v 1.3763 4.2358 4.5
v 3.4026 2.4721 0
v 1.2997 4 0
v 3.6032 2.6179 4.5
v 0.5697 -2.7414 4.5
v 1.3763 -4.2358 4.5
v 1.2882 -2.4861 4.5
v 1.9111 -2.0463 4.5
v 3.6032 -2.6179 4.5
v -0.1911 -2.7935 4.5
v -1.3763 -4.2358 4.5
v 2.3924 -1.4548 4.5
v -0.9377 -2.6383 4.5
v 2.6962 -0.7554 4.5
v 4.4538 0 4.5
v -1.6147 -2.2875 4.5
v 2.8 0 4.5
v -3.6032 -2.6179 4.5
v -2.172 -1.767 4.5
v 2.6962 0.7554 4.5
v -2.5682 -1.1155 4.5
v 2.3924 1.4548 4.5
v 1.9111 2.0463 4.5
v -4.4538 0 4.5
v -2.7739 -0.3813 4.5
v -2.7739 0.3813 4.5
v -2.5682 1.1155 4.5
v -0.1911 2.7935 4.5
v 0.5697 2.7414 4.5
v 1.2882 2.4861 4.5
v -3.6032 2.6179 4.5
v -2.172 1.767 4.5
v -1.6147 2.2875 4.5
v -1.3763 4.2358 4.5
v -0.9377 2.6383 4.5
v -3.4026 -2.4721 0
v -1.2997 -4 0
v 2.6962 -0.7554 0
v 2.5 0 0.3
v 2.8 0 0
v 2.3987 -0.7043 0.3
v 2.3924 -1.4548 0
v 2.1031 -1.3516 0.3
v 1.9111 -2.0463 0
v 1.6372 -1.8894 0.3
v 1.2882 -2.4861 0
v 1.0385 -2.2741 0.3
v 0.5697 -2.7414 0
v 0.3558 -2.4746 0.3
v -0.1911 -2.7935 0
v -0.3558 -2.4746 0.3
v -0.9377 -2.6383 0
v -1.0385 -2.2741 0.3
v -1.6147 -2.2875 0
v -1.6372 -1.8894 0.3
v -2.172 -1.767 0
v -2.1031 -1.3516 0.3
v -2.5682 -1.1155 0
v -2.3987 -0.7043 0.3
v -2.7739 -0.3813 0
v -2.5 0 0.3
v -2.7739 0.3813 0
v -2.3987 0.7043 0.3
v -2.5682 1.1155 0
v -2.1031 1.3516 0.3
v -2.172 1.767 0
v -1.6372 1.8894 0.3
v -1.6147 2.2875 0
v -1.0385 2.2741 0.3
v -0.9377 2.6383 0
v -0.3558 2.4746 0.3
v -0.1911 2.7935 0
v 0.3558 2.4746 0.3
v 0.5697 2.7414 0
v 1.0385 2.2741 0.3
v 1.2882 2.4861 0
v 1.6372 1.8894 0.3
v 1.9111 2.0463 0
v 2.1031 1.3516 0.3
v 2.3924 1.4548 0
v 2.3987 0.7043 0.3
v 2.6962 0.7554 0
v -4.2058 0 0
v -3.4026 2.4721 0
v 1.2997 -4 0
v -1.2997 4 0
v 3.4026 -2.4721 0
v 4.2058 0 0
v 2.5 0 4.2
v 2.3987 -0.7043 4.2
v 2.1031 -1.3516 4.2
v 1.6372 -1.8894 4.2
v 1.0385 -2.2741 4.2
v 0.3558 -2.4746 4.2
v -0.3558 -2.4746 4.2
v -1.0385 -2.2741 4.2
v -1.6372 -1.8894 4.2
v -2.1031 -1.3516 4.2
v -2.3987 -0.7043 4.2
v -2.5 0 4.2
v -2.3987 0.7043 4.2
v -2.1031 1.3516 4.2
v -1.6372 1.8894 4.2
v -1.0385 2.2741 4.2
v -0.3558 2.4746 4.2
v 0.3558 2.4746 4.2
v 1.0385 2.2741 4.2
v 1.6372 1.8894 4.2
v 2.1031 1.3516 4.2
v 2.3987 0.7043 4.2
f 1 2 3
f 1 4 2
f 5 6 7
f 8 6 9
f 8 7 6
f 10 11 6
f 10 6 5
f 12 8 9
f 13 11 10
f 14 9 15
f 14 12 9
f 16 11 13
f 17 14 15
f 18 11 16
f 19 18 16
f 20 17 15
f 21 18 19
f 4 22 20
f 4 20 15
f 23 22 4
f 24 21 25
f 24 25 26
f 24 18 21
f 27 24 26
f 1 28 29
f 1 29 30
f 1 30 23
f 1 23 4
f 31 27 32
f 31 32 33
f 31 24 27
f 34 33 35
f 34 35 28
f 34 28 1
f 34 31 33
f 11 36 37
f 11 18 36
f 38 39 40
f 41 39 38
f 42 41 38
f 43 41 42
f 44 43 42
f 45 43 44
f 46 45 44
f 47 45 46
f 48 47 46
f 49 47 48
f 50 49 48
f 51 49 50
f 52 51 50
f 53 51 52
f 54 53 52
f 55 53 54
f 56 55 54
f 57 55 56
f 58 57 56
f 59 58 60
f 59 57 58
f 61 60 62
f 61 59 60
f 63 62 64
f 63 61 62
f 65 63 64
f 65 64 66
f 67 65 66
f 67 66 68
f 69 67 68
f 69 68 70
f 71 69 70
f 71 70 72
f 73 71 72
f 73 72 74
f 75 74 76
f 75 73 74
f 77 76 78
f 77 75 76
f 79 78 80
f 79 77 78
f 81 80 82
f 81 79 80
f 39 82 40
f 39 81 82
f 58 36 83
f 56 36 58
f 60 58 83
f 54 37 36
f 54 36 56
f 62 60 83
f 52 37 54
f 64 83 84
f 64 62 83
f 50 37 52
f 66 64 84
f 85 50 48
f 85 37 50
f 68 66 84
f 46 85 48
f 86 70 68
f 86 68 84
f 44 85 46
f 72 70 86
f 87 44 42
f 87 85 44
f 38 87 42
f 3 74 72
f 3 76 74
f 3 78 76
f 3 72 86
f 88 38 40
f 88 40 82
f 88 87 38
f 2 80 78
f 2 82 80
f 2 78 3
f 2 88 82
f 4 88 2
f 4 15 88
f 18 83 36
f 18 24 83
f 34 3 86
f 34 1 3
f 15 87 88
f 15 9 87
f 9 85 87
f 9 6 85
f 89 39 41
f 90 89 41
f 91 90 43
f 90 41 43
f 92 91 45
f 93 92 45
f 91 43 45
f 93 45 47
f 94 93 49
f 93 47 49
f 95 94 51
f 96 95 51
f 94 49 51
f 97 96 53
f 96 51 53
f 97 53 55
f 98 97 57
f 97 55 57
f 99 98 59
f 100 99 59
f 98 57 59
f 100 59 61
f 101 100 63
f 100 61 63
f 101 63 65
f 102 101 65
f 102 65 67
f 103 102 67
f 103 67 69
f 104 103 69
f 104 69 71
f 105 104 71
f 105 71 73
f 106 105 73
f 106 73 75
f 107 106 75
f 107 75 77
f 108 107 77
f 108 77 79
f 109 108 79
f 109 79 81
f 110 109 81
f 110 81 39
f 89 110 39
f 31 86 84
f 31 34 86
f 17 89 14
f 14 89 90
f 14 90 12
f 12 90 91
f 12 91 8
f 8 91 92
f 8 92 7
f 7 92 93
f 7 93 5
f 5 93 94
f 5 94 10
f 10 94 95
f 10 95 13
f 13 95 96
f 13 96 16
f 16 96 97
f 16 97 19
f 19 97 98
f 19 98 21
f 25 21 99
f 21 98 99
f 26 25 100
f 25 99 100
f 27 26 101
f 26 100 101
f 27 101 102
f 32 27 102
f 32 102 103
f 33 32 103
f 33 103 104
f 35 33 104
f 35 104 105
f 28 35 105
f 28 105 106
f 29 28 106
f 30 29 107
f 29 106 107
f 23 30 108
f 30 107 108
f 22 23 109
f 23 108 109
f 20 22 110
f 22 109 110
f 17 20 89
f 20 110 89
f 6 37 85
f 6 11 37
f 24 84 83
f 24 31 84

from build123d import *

# Parameters (mm, degrees)
F1_DEPTH = 4.5
F1_TAPER = -3
F2_R     = 2.5
F3_DEPTH = 25
F4_SIZE  = 0.3


with BuildPart() as f1:
    # F0 (on Top) → F1 (new body)
    with BuildSketch(Plane.XY):
        Polygon((-1.2996787849, -4), (1.2996787849, -4), (3.4026032334, -2.472135955), (4.205848897, 0), (3.4026032334, 2.472135955), (1.2996787849, 4), (-1.2996787849, 4), (-3.4026032334, 2.472135955), (-4.205848897, 0), (-3.4026032334, -2.472135955), align=None)
    extrude(amount=F1_DEPTH, taper=F1_TAPER)

    # F2 (on face) → F3 (cut)
    with BuildSketch(Plane(origin=(0, 0, 0), x_dir=(1, 0, 0), z_dir=(0, 0, -1))):
        Circle(F2_R)
    extrude(amount=-F3_DEPTH, mode=Mode.SUBTRACT)

    # F4
    f4_edges = [f1.edges().sort_by_distance(p)[0] for p in [
        (-2.5, 0, 0),
        (-2.5, 0, 4.5),
    ]]
    chamfer(f4_edges, length=F4_SIZE)


solid = f1.part
